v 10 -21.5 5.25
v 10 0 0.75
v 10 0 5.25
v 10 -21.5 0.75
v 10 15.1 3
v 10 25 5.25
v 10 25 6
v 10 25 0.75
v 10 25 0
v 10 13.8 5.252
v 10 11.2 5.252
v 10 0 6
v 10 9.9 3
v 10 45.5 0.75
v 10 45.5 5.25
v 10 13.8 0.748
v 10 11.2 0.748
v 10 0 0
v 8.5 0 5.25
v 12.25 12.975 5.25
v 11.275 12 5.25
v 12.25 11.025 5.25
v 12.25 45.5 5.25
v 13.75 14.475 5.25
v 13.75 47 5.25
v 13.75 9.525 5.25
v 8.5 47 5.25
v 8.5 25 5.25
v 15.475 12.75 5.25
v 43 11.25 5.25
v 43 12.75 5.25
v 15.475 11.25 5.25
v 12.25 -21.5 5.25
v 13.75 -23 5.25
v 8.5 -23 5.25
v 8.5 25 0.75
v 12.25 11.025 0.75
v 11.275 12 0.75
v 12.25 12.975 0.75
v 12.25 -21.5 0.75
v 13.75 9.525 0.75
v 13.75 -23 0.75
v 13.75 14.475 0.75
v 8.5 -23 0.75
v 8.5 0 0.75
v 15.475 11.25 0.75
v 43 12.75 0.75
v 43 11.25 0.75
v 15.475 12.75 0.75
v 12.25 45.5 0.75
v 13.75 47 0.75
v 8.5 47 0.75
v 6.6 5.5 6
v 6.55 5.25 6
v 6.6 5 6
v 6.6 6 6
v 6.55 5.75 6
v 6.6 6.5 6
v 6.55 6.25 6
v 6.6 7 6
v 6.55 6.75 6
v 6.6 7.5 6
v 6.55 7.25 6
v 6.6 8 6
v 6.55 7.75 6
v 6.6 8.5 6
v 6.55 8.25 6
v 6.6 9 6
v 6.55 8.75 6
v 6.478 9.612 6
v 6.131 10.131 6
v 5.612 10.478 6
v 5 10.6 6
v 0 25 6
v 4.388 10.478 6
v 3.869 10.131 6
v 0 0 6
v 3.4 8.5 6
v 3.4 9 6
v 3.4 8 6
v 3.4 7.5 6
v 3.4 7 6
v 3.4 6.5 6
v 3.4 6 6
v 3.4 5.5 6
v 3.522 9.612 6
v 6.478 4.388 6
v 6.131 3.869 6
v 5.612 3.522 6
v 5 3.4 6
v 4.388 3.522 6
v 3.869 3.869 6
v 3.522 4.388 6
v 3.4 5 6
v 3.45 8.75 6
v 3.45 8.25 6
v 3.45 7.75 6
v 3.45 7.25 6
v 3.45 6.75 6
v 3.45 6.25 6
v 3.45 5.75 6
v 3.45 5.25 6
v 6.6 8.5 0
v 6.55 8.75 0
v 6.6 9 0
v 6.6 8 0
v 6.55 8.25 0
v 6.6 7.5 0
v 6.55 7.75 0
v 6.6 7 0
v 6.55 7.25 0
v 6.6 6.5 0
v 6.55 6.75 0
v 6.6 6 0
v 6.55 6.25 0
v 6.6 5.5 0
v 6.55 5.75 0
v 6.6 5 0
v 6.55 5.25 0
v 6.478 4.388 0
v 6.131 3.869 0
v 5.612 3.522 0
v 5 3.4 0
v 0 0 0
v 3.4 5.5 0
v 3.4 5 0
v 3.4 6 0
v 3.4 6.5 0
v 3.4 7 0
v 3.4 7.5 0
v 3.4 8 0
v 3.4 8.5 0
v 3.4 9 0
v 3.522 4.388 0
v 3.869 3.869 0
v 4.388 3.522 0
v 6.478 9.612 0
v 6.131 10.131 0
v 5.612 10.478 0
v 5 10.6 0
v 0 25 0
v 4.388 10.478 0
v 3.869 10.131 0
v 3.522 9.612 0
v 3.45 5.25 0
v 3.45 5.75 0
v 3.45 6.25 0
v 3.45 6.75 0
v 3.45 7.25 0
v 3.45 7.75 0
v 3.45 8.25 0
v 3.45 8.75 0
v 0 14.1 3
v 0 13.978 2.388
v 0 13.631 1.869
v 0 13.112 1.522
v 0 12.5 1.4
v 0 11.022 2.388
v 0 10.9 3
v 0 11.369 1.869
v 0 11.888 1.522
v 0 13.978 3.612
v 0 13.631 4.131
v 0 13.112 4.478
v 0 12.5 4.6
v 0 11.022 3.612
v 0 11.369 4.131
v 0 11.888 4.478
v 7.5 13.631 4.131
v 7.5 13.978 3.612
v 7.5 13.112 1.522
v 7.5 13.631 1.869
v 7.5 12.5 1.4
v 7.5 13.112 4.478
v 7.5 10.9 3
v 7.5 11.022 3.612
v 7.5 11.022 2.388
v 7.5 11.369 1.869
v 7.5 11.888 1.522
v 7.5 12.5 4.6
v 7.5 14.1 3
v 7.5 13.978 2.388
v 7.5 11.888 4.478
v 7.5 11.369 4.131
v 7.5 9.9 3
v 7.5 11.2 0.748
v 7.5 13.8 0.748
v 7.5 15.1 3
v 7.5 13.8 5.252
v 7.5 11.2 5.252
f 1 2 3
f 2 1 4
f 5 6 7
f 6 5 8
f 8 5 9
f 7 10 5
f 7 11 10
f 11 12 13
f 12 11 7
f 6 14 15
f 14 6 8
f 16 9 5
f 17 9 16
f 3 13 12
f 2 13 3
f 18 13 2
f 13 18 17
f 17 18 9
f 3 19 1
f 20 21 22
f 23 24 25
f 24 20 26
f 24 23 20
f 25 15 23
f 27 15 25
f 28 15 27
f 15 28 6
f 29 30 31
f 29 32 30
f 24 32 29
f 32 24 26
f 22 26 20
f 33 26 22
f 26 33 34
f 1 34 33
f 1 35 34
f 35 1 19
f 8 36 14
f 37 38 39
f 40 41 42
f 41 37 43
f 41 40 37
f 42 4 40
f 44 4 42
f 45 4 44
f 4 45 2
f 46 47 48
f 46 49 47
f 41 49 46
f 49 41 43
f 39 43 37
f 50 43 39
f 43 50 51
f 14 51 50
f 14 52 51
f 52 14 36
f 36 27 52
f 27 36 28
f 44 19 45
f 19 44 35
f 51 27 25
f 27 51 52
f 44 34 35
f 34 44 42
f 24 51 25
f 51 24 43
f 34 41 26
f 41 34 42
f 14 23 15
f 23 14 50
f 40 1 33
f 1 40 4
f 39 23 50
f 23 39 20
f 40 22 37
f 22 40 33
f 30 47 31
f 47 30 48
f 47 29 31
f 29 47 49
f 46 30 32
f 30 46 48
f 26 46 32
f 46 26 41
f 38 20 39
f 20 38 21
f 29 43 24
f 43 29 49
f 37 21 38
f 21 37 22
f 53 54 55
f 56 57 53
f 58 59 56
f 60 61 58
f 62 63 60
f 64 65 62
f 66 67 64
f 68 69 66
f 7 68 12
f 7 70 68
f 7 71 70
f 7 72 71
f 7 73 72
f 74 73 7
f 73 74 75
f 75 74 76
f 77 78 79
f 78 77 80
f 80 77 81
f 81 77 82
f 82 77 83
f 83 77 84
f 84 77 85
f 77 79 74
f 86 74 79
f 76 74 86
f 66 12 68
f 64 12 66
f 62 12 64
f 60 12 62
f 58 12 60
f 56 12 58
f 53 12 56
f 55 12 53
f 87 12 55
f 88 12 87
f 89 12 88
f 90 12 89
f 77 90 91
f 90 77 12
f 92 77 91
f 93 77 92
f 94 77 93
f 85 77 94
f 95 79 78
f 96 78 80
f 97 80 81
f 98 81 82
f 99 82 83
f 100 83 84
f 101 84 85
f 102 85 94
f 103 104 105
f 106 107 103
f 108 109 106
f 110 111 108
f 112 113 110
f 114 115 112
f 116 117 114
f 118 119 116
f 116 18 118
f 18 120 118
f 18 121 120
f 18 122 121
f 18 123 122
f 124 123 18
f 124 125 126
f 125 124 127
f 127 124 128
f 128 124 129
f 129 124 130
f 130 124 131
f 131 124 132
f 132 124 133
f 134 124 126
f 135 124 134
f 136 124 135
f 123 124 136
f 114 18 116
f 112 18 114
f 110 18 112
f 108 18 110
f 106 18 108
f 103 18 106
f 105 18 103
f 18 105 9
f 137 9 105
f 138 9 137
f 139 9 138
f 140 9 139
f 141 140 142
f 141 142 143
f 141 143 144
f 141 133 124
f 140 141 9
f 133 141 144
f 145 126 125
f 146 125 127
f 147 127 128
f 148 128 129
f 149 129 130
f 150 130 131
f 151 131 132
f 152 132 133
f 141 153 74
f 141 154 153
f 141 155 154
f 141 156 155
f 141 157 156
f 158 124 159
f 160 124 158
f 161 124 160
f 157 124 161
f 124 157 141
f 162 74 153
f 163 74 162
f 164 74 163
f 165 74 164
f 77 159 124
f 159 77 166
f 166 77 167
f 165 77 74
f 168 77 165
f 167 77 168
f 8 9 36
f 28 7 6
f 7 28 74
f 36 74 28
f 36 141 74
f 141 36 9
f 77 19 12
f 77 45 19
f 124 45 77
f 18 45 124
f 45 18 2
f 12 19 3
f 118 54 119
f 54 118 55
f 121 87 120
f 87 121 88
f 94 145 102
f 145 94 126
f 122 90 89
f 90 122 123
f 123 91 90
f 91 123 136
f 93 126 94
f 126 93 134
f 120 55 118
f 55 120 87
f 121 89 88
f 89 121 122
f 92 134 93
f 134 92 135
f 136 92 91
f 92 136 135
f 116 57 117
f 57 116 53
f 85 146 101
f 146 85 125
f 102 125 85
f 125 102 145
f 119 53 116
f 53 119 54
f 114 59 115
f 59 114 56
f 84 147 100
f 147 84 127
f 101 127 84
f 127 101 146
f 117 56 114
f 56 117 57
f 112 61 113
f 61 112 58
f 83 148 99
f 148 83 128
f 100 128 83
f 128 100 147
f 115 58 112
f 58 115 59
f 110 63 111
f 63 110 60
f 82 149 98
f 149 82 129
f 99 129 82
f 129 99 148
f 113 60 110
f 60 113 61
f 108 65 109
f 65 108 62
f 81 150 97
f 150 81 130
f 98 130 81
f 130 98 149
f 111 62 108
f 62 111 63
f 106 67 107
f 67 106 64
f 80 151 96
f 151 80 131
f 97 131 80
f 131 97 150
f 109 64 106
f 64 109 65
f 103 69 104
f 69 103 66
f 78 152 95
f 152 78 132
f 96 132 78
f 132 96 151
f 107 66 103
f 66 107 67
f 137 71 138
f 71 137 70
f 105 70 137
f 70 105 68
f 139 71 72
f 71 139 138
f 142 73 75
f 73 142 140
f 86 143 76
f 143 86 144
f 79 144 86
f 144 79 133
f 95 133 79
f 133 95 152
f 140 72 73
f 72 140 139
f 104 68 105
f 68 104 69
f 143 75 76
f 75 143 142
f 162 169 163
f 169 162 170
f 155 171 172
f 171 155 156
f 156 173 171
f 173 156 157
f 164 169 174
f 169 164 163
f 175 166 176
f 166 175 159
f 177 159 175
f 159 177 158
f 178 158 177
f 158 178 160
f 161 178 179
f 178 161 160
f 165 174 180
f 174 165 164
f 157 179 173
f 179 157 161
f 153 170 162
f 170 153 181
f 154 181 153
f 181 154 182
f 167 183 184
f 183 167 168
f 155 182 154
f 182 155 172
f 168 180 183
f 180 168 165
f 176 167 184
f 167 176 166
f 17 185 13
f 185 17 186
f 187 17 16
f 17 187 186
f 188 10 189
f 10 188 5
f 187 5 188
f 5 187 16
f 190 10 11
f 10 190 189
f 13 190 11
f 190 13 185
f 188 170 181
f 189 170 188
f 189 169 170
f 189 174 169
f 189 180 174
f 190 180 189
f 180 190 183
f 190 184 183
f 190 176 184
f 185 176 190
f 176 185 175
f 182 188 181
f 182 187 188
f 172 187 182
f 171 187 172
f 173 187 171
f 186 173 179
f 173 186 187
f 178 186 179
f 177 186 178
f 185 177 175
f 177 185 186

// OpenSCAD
// byteborg's adjustable Prusa Y-axis endstop flag

SCREWD=3.2; // for M3 screws
NUTD=5.2;

XDIM=35; // x dimensioning
HINGEW=1.5; // hinge width
HINGEH=4.5; // hinge height
FLAGL=30; // flag length

$fn=16;

module hingedflag() {
	translate([-HINGEW/2,0,0]) cube([HINGEW,XDIM*2,HINGEH], center=true); // hinge back
	translate([-HINGEW/2,XDIM-HINGEW,-HINGEH/2]) cube([HINGEW*3,HINGEW,HINGEH]); // hinge bar
	translate([-HINGEW/2,-XDIM,-HINGEH/2]) cube([HINGEW*3,HINGEW,HINGEH]); // hinge bar
	translate([HINGEW*2,0,0]) cube([HINGEW,XDIM*2,HINGEH], center=true); // hinge front
	translate([HINGEW*2,-1.5/2,-HINGEH/2]) cube([FLAGL,1.5,4.5]); // flag
	translate([HINGEW*2.5,0,0]) rotate([0,0,-45]) cube([3.5,3.5,4.5], center=true); // screw counterpart
}

difference() {
	union() {
		cube([10,25,6]);
		translate([10,12,3]) hingedflag();
	}
	translate([0,0,-10]) union() {
		for(i = [5:.5:9])
			translate([5,i,0]) cylinder(r=SCREWD/2, h=20);
		for(i = [20:.5:16])
			translate([5,i,0]) cylinder(r=SCREWD/2, h=20);
	}
	translate([-9.5,12.5,6/2]) rotate([0,90,0]) {
		cylinder(r=SCREWD/2, h=20);
		translate([0,0,20-3]) rotate([0,0,30]) cylinder(r=NUTD/2, h=3, $fn=0, $fa=60);
	}
}
